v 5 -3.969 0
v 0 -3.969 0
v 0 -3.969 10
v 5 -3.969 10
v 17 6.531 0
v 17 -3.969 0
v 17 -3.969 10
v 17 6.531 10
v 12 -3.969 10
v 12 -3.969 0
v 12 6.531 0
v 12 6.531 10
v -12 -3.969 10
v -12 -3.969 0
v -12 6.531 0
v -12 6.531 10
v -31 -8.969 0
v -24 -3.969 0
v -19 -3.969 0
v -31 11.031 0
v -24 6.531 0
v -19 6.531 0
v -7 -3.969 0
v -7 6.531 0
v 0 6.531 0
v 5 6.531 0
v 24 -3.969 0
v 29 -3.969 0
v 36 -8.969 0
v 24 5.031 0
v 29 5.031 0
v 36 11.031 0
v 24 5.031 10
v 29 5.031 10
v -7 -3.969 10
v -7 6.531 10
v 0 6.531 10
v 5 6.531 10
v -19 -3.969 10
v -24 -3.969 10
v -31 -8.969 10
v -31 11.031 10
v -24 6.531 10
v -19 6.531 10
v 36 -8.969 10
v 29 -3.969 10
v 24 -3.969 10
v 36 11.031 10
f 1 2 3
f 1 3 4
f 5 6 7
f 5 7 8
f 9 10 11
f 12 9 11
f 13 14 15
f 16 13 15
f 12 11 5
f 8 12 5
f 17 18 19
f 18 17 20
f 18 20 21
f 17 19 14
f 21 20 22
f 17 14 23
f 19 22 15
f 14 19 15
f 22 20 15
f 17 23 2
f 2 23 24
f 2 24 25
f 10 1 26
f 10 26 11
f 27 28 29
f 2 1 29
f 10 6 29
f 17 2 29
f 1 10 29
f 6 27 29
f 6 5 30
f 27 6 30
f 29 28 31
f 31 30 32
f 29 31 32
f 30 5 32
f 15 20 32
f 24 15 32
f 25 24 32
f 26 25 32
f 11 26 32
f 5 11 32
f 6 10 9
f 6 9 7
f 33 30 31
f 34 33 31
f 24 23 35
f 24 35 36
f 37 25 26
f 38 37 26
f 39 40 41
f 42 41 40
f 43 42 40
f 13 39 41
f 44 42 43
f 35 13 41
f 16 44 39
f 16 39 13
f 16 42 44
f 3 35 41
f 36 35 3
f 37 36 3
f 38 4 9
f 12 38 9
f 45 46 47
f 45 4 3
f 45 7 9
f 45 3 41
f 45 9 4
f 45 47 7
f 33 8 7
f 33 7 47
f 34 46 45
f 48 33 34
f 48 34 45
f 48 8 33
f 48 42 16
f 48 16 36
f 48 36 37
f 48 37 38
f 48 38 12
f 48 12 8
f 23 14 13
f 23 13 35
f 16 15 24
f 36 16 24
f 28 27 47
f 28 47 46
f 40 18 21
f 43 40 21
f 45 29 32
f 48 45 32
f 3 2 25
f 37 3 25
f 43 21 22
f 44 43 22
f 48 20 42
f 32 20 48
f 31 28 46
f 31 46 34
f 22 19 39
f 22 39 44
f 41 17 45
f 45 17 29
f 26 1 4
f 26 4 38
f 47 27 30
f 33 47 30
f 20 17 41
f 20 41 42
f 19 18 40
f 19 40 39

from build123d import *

# Parameters (mm, degrees)
F0_W     = 67
F0_H     = 20
F0_W_2   = 5
F0_H_2   = 9
F0_H_3   = 10.5
F1_DEPTH = 10


with BuildPart() as f1:
    # F0 (on Top) → F1 (new body)
    with BuildSketch(Plane.XY):
        with Locations((2.5, 1.031276)):
            Rectangle(F0_W, F0_H)
        with Locations((26.5, 0.531276)):
            Rectangle(F0_W_2, F0_H_2, mode=Mode.SUBTRACT)
        with Locations((-21.5, 1.281276)):
            Rectangle(F0_W_2, F0_H_3, mode=Mode.SUBTRACT)
        with Locations((-9.5, 1.281276)):
            Rectangle(F0_W_2, F0_H_3, mode=Mode.SUBTRACT)
        with Locations((2.5, 1.281276)):
            Rectangle(F0_W_2, F0_H_3, mode=Mode.SUBTRACT)
        with Locations((14.5, 1.281276)):
            Rectangle(F0_W_2, F0_H_3, mode=Mode.SUBTRACT)
    extrude(amount=F1_DEPTH)


solid = f1.part
